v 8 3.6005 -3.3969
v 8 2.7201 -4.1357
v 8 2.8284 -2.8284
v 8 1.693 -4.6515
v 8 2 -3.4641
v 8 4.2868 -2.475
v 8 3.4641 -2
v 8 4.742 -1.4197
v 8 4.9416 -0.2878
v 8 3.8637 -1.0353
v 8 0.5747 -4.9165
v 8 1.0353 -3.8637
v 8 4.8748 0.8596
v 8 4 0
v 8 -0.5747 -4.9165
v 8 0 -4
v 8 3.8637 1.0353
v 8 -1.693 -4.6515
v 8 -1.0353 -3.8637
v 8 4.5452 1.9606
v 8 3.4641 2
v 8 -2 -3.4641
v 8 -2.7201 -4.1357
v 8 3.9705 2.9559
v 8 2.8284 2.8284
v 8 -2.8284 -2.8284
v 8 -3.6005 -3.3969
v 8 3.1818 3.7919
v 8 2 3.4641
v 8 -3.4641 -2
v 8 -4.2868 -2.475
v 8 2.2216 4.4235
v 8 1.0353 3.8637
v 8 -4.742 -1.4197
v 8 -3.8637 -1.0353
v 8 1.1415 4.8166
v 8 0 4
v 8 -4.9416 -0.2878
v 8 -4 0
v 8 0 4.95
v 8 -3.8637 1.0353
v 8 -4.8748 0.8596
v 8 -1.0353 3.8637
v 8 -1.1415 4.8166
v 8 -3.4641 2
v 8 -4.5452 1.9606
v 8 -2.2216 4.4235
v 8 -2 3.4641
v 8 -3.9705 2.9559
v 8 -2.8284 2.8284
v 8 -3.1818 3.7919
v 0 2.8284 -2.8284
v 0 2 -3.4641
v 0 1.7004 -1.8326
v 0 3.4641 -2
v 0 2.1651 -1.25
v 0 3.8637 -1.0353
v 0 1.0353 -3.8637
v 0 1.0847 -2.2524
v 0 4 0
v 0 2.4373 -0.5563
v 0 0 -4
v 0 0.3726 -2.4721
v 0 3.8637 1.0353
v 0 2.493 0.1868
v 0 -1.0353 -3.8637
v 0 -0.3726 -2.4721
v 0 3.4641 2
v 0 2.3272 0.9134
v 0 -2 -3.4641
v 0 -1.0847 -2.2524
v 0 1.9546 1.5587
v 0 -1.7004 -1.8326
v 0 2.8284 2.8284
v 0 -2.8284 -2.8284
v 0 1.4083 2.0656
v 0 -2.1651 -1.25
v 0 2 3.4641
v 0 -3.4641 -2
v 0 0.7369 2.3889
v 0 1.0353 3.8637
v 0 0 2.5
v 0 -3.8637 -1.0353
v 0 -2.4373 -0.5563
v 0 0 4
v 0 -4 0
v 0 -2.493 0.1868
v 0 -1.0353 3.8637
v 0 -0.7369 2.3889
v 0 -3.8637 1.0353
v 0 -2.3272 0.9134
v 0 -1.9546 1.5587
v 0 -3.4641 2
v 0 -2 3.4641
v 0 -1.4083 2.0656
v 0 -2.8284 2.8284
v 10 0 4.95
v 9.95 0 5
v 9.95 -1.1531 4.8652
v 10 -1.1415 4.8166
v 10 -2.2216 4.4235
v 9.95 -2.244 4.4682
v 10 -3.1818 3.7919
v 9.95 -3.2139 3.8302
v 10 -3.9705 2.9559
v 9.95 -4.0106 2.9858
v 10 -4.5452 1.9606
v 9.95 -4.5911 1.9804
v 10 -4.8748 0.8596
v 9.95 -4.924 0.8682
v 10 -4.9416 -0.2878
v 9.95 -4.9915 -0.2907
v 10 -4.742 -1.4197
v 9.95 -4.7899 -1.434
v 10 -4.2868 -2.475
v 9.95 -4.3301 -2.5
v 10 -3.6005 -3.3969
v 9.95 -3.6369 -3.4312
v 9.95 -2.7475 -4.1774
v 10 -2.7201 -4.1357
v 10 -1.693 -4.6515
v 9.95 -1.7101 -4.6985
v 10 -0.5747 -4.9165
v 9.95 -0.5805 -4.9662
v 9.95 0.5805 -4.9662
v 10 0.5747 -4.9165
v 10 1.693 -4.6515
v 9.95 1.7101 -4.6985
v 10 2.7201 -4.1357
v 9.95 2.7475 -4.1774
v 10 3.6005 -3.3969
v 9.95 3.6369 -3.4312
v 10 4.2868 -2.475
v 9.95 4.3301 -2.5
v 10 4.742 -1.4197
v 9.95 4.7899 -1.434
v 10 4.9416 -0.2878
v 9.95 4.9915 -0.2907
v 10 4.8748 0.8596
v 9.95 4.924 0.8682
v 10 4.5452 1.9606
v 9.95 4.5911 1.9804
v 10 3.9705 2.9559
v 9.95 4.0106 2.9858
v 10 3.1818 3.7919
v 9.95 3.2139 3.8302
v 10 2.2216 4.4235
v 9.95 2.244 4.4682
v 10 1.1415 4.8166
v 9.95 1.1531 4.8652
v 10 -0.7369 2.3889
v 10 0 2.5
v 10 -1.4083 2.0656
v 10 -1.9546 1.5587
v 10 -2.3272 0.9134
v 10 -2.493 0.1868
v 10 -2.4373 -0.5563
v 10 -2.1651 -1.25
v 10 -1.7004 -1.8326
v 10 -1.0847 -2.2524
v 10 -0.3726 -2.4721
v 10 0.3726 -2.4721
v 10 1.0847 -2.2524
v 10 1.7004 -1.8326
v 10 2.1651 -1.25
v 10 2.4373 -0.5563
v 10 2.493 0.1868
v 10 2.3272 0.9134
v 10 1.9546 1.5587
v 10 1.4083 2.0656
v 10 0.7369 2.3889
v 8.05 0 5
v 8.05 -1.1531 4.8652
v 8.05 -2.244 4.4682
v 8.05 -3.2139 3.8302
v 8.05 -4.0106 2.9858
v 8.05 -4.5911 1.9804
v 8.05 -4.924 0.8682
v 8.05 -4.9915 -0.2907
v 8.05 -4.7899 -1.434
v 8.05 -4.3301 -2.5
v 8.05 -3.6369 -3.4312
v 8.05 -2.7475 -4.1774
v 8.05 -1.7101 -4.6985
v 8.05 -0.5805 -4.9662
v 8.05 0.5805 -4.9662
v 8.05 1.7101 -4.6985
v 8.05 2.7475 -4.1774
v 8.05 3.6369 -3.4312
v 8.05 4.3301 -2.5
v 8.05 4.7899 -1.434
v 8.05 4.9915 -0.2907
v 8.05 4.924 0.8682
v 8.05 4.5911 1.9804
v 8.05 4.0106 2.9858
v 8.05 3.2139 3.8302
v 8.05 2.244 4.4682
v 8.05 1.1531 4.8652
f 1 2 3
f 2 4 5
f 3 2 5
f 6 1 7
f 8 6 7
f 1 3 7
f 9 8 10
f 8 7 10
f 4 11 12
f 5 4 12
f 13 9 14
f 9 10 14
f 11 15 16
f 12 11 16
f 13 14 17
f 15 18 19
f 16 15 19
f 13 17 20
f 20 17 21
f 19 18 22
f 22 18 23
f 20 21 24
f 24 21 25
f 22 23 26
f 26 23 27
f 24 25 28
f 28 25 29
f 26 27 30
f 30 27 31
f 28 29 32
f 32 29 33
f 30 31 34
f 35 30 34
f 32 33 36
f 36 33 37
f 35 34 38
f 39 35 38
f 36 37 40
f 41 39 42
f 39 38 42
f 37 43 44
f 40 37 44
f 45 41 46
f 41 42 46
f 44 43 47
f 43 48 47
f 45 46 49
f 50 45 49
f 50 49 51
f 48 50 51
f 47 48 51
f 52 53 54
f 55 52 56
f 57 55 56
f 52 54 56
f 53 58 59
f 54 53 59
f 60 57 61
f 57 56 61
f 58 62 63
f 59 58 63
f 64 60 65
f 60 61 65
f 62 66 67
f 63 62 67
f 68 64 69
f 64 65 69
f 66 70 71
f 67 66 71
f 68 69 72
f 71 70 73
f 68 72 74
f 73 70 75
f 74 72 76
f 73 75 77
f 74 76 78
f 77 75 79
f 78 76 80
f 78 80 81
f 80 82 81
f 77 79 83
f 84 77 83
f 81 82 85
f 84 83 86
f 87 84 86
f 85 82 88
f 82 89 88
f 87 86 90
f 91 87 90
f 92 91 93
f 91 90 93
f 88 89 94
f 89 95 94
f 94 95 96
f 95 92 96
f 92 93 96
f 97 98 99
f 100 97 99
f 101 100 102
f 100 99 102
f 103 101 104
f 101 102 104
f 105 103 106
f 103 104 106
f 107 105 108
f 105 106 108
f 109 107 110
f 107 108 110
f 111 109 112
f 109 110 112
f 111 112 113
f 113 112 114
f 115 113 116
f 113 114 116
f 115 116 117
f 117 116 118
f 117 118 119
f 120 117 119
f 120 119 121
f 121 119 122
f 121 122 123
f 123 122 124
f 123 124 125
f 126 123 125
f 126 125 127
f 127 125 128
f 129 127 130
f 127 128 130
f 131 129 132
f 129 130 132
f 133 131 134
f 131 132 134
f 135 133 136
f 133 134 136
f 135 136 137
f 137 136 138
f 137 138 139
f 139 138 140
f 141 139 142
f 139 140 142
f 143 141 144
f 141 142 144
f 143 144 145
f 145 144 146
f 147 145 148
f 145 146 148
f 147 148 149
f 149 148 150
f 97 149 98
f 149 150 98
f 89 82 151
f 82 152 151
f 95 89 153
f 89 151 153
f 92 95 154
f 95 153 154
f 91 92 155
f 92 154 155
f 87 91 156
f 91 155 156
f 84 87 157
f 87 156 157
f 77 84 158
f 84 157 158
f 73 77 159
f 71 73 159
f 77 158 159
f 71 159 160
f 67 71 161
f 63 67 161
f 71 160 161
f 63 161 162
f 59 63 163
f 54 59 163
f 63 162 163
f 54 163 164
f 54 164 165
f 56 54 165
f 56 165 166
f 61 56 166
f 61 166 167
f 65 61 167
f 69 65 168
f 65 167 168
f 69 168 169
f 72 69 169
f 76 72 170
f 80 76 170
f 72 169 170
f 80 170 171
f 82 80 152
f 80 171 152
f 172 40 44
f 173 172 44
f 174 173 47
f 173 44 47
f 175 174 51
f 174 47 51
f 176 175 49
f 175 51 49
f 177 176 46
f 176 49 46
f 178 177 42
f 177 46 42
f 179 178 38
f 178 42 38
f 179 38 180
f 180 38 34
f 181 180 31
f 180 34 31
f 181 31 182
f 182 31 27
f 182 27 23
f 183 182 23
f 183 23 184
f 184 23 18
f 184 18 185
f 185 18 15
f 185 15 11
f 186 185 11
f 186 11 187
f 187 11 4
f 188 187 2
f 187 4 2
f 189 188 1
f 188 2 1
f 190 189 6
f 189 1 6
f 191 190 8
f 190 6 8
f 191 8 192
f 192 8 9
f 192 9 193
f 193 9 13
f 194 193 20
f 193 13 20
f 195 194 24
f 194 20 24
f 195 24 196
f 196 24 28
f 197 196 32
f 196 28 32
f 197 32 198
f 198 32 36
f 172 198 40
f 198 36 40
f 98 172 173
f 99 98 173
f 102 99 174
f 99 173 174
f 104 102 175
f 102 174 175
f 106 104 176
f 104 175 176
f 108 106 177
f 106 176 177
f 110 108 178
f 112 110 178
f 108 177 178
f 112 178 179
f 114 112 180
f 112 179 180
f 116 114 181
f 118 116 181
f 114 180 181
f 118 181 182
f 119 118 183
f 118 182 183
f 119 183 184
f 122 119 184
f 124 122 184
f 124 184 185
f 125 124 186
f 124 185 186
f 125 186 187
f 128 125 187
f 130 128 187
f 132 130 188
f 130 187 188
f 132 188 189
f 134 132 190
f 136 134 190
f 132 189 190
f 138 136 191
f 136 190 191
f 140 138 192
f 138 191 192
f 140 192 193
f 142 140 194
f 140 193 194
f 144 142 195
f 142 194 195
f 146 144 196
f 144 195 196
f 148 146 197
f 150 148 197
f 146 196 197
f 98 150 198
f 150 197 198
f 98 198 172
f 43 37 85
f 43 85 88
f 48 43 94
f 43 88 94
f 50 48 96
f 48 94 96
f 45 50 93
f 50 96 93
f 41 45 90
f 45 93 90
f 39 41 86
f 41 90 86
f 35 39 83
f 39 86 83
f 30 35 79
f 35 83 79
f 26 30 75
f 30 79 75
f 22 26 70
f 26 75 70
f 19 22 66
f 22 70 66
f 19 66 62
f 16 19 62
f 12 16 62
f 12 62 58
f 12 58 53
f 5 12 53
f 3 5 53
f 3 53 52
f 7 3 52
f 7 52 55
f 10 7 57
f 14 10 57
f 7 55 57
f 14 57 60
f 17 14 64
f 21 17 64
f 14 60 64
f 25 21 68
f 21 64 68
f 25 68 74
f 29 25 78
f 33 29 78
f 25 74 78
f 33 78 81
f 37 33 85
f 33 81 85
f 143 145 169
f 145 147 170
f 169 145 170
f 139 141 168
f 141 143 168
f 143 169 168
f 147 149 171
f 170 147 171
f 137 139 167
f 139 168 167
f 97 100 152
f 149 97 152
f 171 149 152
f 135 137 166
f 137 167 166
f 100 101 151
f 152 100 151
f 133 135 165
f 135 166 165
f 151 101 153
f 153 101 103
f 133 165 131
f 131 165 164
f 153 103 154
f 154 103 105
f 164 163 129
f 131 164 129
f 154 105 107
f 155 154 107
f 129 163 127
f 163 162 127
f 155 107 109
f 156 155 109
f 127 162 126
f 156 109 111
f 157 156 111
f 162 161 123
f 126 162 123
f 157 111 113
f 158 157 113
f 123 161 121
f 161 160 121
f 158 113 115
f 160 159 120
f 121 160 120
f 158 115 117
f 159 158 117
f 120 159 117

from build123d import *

# Parameters (mm, degrees)
F2_SIZE2 = 0.05
F2_SIZE  = 0.05


with BuildPart() as f1:
    # F0 (on Front) → F1 (revolve)
    with BuildSketch(Plane.XZ):
        Polygon((0, 4), (0, 2.5), (10, 2.5), (10, 5), (8, 5), (8, 4), align=None)
    revolve(axis=Axis((5, 0, 0), (1, 0, 0)))

    # F2
    f2_edges = [f1.edges().sort_by_distance(p)[0] for p in [
        (10, 0, -5),
        (8, 0, -5),
    ]]
    chamfer(f2_edges, length=F2_SIZE, length2=F2_SIZE2)


solid = f1.part
